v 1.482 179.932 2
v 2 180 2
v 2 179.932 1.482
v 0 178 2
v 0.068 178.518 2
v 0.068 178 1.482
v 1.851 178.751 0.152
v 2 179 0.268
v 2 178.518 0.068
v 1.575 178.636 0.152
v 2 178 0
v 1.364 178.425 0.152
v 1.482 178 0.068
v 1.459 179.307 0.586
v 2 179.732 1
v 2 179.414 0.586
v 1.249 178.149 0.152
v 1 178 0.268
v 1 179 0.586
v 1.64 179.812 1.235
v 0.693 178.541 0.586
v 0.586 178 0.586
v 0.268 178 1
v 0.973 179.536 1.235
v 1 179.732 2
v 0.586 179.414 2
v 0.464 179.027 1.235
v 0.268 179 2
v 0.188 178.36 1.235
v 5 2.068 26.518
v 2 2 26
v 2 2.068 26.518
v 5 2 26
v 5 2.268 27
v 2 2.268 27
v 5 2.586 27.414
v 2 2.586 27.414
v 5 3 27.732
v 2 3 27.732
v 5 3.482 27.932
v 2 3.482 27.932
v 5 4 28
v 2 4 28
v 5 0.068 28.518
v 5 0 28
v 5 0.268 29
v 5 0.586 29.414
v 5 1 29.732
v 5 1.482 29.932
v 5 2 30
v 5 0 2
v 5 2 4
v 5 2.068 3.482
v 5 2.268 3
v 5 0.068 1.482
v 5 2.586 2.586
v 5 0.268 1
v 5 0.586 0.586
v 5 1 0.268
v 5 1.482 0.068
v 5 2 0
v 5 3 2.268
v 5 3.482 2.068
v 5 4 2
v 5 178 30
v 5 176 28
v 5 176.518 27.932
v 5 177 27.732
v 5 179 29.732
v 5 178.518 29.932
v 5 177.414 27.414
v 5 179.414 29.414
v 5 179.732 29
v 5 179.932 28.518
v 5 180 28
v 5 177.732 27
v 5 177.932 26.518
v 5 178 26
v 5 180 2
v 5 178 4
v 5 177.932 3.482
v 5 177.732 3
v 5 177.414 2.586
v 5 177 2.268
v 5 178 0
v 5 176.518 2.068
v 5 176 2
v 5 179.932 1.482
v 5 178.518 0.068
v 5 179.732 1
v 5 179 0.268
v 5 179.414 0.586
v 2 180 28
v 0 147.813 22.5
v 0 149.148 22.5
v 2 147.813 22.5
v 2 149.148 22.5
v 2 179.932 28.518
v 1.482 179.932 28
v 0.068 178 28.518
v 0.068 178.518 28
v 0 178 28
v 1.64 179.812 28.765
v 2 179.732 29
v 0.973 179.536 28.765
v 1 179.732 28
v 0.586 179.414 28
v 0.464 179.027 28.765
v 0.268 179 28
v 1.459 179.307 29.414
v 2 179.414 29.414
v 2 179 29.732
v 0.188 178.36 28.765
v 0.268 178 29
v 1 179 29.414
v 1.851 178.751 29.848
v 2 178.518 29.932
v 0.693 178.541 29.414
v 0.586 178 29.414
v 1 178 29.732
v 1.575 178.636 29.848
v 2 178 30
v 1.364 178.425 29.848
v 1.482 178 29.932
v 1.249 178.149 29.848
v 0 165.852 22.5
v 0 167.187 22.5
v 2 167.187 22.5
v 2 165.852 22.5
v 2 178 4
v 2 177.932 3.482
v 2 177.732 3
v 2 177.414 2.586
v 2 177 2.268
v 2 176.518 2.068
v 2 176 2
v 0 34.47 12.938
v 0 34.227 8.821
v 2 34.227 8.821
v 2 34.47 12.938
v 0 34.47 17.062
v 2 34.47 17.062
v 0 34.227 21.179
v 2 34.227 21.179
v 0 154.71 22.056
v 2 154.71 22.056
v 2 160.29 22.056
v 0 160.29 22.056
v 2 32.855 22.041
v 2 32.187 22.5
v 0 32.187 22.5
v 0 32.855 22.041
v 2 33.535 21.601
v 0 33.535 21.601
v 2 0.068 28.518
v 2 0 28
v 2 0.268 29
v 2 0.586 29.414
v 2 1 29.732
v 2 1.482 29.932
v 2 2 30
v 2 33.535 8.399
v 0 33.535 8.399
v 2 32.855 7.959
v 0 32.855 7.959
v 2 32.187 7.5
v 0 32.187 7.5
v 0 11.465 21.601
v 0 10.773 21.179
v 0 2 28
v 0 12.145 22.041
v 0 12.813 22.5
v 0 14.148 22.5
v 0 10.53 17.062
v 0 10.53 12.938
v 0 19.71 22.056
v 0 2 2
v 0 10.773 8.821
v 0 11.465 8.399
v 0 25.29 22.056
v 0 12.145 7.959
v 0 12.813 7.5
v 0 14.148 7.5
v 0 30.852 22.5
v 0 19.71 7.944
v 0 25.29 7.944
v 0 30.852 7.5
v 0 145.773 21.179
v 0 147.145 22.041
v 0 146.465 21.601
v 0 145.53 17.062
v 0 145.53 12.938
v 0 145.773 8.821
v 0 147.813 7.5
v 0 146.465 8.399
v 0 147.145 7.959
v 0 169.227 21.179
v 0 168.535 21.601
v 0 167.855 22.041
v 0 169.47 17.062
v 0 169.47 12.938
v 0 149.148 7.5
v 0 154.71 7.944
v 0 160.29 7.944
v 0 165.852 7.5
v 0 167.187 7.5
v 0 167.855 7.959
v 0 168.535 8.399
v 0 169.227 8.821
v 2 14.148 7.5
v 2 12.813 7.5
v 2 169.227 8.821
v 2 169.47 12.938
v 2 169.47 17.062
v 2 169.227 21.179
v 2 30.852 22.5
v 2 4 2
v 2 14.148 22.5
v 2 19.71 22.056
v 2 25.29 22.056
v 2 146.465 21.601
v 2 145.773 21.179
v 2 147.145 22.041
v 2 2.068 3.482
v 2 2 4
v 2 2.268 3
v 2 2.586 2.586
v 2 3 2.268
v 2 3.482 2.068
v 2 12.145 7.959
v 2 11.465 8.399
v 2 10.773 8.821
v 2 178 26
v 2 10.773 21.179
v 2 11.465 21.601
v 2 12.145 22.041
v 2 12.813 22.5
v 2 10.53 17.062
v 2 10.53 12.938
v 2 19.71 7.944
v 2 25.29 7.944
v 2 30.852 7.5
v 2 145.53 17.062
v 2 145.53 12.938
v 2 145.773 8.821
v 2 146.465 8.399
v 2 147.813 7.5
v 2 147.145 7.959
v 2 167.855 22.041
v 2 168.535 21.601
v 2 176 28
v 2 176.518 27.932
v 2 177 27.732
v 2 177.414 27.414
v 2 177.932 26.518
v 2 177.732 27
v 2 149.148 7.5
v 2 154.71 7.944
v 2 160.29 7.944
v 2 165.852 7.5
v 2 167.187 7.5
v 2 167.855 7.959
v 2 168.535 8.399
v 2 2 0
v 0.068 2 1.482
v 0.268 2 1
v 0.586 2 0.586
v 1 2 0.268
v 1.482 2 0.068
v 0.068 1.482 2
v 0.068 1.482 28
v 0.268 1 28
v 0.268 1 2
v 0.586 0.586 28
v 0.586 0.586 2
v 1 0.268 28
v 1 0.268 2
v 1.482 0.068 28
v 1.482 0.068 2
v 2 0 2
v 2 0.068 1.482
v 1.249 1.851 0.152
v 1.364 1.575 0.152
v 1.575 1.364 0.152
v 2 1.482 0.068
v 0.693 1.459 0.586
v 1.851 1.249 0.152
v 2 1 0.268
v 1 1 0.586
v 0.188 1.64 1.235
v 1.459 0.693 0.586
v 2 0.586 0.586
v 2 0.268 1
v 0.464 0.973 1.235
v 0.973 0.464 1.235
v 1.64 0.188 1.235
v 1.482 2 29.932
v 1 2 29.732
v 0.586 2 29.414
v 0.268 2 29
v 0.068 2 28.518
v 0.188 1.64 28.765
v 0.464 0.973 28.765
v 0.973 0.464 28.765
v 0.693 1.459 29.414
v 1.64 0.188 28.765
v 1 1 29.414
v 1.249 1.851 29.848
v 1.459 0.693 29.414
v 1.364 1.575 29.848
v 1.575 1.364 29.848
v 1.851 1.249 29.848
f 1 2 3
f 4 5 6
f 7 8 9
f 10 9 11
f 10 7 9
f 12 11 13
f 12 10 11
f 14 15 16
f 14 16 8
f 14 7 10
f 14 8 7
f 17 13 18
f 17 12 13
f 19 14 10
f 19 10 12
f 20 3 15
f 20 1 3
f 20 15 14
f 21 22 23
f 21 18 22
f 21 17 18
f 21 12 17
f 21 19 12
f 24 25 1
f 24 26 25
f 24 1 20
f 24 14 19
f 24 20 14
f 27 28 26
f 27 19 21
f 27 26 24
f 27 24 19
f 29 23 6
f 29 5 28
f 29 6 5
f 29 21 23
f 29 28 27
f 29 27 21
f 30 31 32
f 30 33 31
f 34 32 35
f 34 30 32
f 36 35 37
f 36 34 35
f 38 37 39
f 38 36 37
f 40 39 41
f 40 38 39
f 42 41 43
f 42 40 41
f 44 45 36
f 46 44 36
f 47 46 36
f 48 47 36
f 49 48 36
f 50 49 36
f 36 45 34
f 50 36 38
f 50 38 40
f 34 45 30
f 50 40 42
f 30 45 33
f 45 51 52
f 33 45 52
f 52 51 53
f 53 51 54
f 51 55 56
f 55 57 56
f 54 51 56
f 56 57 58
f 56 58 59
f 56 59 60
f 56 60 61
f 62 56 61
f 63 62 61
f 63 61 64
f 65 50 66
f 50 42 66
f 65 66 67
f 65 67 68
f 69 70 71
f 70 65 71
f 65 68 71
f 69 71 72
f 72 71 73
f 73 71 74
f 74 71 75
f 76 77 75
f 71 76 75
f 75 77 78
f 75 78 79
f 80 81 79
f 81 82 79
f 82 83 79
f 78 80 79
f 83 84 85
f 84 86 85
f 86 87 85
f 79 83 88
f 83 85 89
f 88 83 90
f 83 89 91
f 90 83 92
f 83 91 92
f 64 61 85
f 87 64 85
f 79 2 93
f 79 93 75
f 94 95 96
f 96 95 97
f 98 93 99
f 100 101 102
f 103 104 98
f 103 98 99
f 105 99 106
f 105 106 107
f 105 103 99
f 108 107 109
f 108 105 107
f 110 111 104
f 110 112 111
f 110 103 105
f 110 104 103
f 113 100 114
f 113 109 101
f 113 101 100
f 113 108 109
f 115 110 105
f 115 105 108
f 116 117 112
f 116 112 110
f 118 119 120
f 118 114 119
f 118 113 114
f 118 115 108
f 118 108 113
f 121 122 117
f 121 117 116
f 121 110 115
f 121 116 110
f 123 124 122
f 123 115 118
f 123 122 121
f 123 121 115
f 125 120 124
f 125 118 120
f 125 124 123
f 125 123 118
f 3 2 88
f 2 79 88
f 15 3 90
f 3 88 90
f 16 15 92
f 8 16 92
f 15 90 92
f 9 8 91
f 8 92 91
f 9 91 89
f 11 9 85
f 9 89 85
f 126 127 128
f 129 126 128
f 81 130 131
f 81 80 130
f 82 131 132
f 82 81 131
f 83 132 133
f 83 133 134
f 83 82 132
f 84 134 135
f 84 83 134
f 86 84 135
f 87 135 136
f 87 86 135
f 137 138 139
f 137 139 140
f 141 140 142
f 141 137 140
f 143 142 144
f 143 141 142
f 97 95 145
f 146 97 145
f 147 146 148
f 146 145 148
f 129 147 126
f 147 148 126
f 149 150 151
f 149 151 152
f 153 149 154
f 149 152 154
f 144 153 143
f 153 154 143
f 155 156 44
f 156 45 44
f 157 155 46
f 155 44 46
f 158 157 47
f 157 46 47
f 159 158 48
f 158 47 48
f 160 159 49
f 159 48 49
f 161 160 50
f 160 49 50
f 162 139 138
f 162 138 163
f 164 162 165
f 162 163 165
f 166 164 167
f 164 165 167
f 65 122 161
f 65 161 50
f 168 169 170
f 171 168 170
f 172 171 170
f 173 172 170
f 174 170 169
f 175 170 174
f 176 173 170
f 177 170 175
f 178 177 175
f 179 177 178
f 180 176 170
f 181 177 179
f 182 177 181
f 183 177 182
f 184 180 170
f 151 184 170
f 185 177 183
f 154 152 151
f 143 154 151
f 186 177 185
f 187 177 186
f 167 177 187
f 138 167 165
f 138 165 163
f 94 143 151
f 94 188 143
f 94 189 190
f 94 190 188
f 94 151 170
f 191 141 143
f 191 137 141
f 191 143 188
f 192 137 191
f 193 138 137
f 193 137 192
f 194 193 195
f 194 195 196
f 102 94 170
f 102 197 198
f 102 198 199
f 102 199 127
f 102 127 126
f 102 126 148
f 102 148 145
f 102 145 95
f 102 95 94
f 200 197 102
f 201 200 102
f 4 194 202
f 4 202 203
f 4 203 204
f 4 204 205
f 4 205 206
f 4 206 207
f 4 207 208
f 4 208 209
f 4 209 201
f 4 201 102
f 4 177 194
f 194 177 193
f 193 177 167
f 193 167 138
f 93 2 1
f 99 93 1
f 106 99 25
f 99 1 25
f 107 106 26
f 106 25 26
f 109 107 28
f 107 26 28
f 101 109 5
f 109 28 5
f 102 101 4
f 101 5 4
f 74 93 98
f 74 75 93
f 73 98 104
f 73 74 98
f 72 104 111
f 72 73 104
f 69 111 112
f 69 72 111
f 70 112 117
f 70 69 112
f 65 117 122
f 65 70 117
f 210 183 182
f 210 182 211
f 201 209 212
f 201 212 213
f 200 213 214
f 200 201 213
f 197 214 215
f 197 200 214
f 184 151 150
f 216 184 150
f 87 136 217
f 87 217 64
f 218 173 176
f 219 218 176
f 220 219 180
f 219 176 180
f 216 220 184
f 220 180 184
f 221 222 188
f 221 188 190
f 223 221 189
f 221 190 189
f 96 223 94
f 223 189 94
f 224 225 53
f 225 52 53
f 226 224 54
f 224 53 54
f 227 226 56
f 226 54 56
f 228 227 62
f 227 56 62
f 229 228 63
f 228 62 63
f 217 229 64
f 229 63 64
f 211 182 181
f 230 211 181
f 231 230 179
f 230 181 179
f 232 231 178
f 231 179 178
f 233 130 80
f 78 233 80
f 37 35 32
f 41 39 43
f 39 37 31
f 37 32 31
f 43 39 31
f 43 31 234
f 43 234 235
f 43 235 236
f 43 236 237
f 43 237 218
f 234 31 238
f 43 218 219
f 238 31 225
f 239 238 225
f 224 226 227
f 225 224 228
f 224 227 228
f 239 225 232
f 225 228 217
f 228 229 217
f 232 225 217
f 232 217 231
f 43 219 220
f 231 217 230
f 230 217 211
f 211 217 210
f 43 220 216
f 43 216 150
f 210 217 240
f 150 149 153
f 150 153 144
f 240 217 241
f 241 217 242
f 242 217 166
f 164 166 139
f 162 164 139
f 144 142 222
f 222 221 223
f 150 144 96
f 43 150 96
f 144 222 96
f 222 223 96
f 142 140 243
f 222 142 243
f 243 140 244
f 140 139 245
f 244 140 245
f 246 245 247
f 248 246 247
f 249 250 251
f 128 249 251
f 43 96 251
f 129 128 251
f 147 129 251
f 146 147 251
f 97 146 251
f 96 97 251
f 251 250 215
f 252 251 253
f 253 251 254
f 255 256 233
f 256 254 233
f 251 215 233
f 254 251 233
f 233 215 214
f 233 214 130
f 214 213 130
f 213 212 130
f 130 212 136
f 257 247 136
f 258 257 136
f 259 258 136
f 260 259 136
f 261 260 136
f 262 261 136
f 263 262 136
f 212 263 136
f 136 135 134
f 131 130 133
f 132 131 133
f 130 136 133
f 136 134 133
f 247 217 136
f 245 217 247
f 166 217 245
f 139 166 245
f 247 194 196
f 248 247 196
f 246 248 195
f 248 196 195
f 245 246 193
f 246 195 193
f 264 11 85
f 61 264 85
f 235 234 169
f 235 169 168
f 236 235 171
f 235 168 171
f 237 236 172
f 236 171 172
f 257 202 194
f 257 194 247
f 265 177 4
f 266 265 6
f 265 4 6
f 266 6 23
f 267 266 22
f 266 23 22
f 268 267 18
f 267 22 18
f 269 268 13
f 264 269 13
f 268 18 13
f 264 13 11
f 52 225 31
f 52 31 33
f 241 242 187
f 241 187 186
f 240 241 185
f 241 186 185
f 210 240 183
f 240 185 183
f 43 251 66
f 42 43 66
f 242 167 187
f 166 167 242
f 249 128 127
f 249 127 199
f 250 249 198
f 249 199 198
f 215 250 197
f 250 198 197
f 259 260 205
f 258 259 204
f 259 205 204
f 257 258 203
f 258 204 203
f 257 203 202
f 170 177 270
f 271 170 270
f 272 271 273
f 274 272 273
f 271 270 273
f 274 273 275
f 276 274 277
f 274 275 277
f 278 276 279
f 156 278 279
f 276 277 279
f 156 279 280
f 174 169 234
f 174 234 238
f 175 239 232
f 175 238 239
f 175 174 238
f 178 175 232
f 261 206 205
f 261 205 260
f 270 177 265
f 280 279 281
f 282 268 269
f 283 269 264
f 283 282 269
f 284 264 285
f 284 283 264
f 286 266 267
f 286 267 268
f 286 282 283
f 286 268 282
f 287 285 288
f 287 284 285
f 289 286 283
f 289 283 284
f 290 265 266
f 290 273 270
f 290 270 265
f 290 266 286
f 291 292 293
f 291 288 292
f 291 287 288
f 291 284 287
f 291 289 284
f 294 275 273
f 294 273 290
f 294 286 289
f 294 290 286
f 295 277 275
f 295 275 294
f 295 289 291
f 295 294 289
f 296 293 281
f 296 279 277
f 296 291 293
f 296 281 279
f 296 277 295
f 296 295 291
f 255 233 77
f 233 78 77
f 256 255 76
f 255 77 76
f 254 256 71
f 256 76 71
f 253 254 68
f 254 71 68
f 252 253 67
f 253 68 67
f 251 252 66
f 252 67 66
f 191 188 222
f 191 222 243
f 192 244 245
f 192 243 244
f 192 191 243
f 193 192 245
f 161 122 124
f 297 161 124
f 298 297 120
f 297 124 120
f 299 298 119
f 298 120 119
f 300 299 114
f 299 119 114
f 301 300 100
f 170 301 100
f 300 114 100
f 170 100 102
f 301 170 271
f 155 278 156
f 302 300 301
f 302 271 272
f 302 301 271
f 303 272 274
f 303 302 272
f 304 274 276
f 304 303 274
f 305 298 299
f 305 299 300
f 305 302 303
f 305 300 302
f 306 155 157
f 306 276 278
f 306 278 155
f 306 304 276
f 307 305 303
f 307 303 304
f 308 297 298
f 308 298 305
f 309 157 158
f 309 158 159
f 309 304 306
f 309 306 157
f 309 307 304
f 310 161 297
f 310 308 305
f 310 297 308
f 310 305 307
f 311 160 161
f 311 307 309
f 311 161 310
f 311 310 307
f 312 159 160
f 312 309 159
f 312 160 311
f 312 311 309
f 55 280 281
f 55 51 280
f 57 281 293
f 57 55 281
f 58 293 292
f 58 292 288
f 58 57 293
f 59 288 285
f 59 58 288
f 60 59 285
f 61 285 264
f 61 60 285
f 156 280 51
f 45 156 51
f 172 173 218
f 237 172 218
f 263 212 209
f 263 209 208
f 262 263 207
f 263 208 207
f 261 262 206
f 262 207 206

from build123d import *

# Parameters (mm, degrees)
BOX002_W          = 3
BOX002_H          = 176
BOX002_DEPTH      = 26
FILLET001_R       = 2
CYLINDER020_R     = 30
CYLINDER020_DEPTH = 10
CYLINDER019_R     = 30
CYLINDER019_DEPTH = 10
CYLINDER018_R     = 30
CYLINDER018_DEPTH = 10
CYLINDER016_R     = 30
CYLINDER016_DEPTH = 10
CYLINDER017_R     = 70
CYLINDER017_DEPTH = 10
CYLINDER015_R     = 70
CYLINDER015_DEPTH = 10
CYLINDER014_R     = 70
CYLINDER014_DEPTH = 10
CYLINDER013_R     = 70
CYLINDER013_DEPTH = 10
BOX004_W          = 10
BOX004_H          = 24
BOX004_DEPTH      = 15
CYLINDER012_R     = 30
CYLINDER012_DEPTH = 10
CYLINDER011_R     = 30
CYLINDER011_DEPTH = 10
CYLINDER010_R     = 30
CYLINDER010_DEPTH = 10
CYLINDER008_R     = 30
CYLINDER008_DEPTH = 10
CYLINDER009_R     = 70
CYLINDER009_DEPTH = 10
CYLINDER006_R     = 70
CYLINDER006_DEPTH = 10
CYLINDER005_R     = 70
CYLINDER005_DEPTH = 10
CYLINDER004_R     = 70
CYLINDER004_DEPTH = 10
BOX003_W          = 10
BOX003_H          = 24
BOX003_DEPTH      = 15
BOX_W             = 2
BOX_H             = 176
BOX_DEPTH         = 26
CYLINDER_R        = 2
CYLINDER_DEPTH    = 26
CYLINDER001_R     = 2
CYLINDER001_DEPTH = 26
CYLINDER002_R     = 2
CYLINDER002_DEPTH = 176
CYLINDER003_R     = 2
CYLINDER003_DEPTH = 176
BOX001_W          = 3
BOX001_H          = 180
BOX001_DEPTH      = 30
FILLET_R          = 2


with BuildPart() as fillet001:
    # Box002 → Box002 (new body)
    with BuildSketch(Plane(origin=(7, 2, 2), x_dir=(1, 0, 0), z_dir=(0, 0, 1))):
        with Locations((1.5, 88)):
            Rectangle(BOX002_W, BOX002_H)
    extrude(amount=BOX002_DEPTH)

    # Fillet001
    fillet001_edges = [fillet001.edges().sort_by_distance(p)[0] for p in [
        (8.5, 2, 2),
        (8.5, 2, 28),
        (8.5, 178, 2),
        (8.5, 178, 28),
    ]]
    fillet(fillet001_edges, radius=FILLET001_R)


with BuildPart() as fillet001_1:
    # Fillet001 placement: moved
    add(fillet001.part.moved(Location((-5, 0, 0))))


with BuildPart() as cylinder020:
    # Cylinder020 → Cylinder020 (new body)
    with BuildSketch(Plane(origin=(22, -27, 39.5), x_dir=(0, 0, -1), z_dir=(1, 0, 0))):
        Circle(CYLINDER020_R)
    extrude(amount=CYLINDER020_DEPTH)


with BuildPart() as cylinder019:
    # Cylinder019 → Cylinder019 (new body)
    with BuildSketch(Plane(origin=(22, -27, -24.5), x_dir=(0, 0, -1), z_dir=(1, 0, 0))):
        Circle(CYLINDER019_R)
    extrude(amount=CYLINDER019_DEPTH)


with BuildPart() as cylinder018:
    # Cylinder018 → Cylinder018 (new body)
    with BuildSketch(Plane(origin=(22, 27, -24.5), x_dir=(0, 0, -1), z_dir=(1, 0, 0))):
        Circle(CYLINDER018_R)
    extrude(amount=CYLINDER018_DEPTH)


with BuildPart() as cylinder016:
    # Cylinder016 → Cylinder016 (new body)
    with BuildSketch(Plane(origin=(22, 27, 39.5), x_dir=(0, 0, -1), z_dir=(1, 0, 0))):
        Circle(CYLINDER016_R)
    extrude(amount=CYLINDER016_DEPTH)


with BuildPart() as cylinder017:
    # Cylinder017 → Cylinder017 (new body)
    with BuildSketch(Plane(origin=(22, -58, 7.5), x_dir=(0, 0, -1), z_dir=(1, 0, 0))):
        Circle(CYLINDER017_R)
    extrude(amount=CYLINDER017_DEPTH)


with BuildPart() as cylinder015:
    # Cylinder015 → Cylinder015 (new body)
    with BuildSketch(Plane(origin=(22, 58, 7.5), x_dir=(0, 0, -1), z_dir=(1, 0, 0))):
        Circle(CYLINDER015_R)
    extrude(amount=CYLINDER015_DEPTH)


with BuildPart() as cylinder014:
    # Cylinder014 → Cylinder014 (new body)
    with BuildSketch(Plane(origin=(22, 0, 84.5), x_dir=(0, 0, -1), z_dir=(1, 0, 0))):
        Circle(CYLINDER014_R)
    extrude(amount=CYLINDER014_DEPTH)


with BuildPart() as cylinder013:
    # Cylinder013 → Cylinder013 (new body)
    with BuildSketch(Plane(origin=(22, 0, -69.5), x_dir=(0, 0, -1), z_dir=(1, 0, 0))):
        Circle(CYLINDER013_R)
    extrude(amount=CYLINDER013_DEPTH)


with BuildPart() as cut011:
    # Box004 → Box004 (new body)
    with BuildSketch(Plane(origin=(22, -12, 0), x_dir=(1, 0, 0), z_dir=(0, 0, 1))):
        with Locations((5, 12)):
            Rectangle(BOX004_W, BOX004_H)
    extrude(amount=BOX004_DEPTH)

    # Cut006: cut Cylinder013
    add(cylinder013.part, mode=Mode.SUBTRACT)

    # Cut007: cut Cylinder014
    add(cylinder014.part, mode=Mode.SUBTRACT)

    # Common002: intersect Cylinder015
    add(cylinder015.part, mode=Mode.INTERSECT)

    # Common003: intersect Cylinder017
    add(cylinder017.part, mode=Mode.INTERSECT)

    # Cut008: cut Cylinder016
    add(cylinder016.part, mode=Mode.SUBTRACT)

    # Cut009: cut Cylinder018
    add(cylinder018.part, mode=Mode.SUBTRACT)

    # Cut010: cut Cylinder019
    add(cylinder019.part, mode=Mode.SUBTRACT)

    # Cut011: cut Cylinder020
    add(cylinder020.part, mode=Mode.SUBTRACT)


with BuildPart() as cut011_1:
    # Cut011 placement: moved
    add(cut011.part.moved(Location((-25, 22.5, 7.5))))


with BuildPart() as cylinder012:
    # Cylinder012 → Cylinder012 (new body)
    with BuildSketch(Plane(origin=(22, -27, 39.5), x_dir=(0, 0, -1), z_dir=(1, 0, 0))):
        Circle(CYLINDER012_R)
    extrude(amount=CYLINDER012_DEPTH)


with BuildPart() as cylinder011:
    # Cylinder011 → Cylinder011 (new body)
    with BuildSketch(Plane(origin=(22, -27, -24.5), x_dir=(0, 0, -1), z_dir=(1, 0, 0))):
        Circle(CYLINDER011_R)
    extrude(amount=CYLINDER011_DEPTH)


with BuildPart() as cylinder010:
    # Cylinder010 → Cylinder010 (new body)
    with BuildSketch(Plane(origin=(22, 27, -24.5), x_dir=(0, 0, -1), z_dir=(1, 0, 0))):
        Circle(CYLINDER010_R)
    extrude(amount=CYLINDER010_DEPTH)


with BuildPart() as cylinder008:
    # Cylinder008 → Cylinder008 (new body)
    with BuildSketch(Plane(origin=(22, 27, 39.5), x_dir=(0, 0, -1), z_dir=(1, 0, 0))):
        Circle(CYLINDER008_R)
    extrude(amount=CYLINDER008_DEPTH)


with BuildPart() as cylinder009:
    # Cylinder009 → Cylinder009 (new body)
    with BuildSketch(Plane(origin=(22, -58, 7.5), x_dir=(0, 0, -1), z_dir=(1, 0, 0))):
        Circle(CYLINDER009_R)
    extrude(amount=CYLINDER009_DEPTH)


with BuildPart() as cylinder006:
    # Cylinder006 → Cylinder006 (new body)
    with BuildSketch(Plane(origin=(22, 58, 7.5), x_dir=(0, 0, -1), z_dir=(1, 0, 0))):
        Circle(CYLINDER006_R)
    extrude(amount=CYLINDER006_DEPTH)


with BuildPart() as cylinder005:
    # Cylinder005 → Cylinder005 (new body)
    with BuildSketch(Plane(origin=(22, 0, 84.5), x_dir=(0, 0, -1), z_dir=(1, 0, 0))):
        Circle(CYLINDER005_R)
    extrude(amount=CYLINDER005_DEPTH)


with BuildPart() as cylinder:
    # Cylinder004 → Cylinder004 (new body)
    with BuildSketch(Plane(origin=(22, 0, -69.5), x_dir=(0, 0, -1), z_dir=(1, 0, 0))):
        Circle(CYLINDER004_R)
    extrude(amount=CYLINDER004_DEPTH)


with BuildPart() as cut005:
    # Box003 → Box003 (new body)
    with BuildSketch(Plane(origin=(22, -12, 0), x_dir=(1, 0, 0), z_dir=(0, 0, 1))):
        with Locations((5, 12)):
            Rectangle(BOX003_W, BOX003_H)
    extrude(amount=BOX003_DEPTH)

    # Cut: cut Cylinder
    add(cylinder.part, mode=Mode.SUBTRACT)

    # Cut001: cut Cylinder005
    add(cylinder005.part, mode=Mode.SUBTRACT)

    # Common: intersect Cylinder006
    add(cylinder006.part, mode=Mode.INTERSECT)

    # Common001: intersect Cylinder009
    add(cylinder009.part, mode=Mode.INTERSECT)

    # Cut002: cut Cylinder008
    add(cylinder008.part, mode=Mode.SUBTRACT)

    # Cut003: cut Cylinder010
    add(cylinder010.part, mode=Mode.SUBTRACT)

    # Cut004: cut Cylinder011
    add(cylinder011.part, mode=Mode.SUBTRACT)

    # Cut005: cut Cylinder012
    add(cylinder012.part, mode=Mode.SUBTRACT)


with BuildPart() as cut005_1:
    # Cut005 placement: moved
    add(cut005.part.moved(Location((-25, 157.5, 7.5))))


with BuildPart() as cube001:
    # Box → Box (new body)
    with BuildSketch(Plane(origin=(0, 2, 2), x_dir=(1, 0, 0), z_dir=(0, 0, 1))):
        with Locations((1, 88)):
            Rectangle(BOX_W, BOX_H)
    extrude(amount=BOX_DEPTH)


with BuildPart() as cylinder001:
    # Cylinder → Cylinder (new body)
    with BuildSketch(Plane(origin=(2, 2, 2), x_dir=(0, 1, 0), z_dir=(0, 0, 1))):
        Circle(CYLINDER_R)
    extrude(amount=CYLINDER_DEPTH)


with BuildPart() as cylinder002:
    # Cylinder001 → Cylinder001 (new body)
    with BuildSketch(Plane(origin=(2, 178, 2), x_dir=(0, 1, 0), z_dir=(0, 0, 1))):
        Circle(CYLINDER001_R)
    extrude(amount=CYLINDER001_DEPTH)


with BuildPart() as cylinder003:
    # Cylinder002 → Cylinder002 (new body)
    with BuildSketch(Plane(origin=(2, 178, 2), x_dir=(1, 0, 0), z_dir=(0, -1, 0))):
        Circle(CYLINDER002_R)
    extrude(amount=CYLINDER002_DEPTH)


with BuildPart() as cylinder004:
    # Cylinder003 → Cylinder003 (new body)
    with BuildSketch(Plane(origin=(2, 178, 28), x_dir=(1, 0, 0), z_dir=(0, -1, 0))):
        Circle(CYLINDER003_R)
    extrude(amount=CYLINDER003_DEPTH)


with BuildPart() as sphere001:
    # Sphere → Sphere (revolve)
    with BuildSketch(Plane(origin=(2, 2, 2), x_dir=(1, 0, 0), z_dir=(0, -1, 0))):
        with BuildLine():
            ThreePointArc((0, -2), (2, 0), (0, 2))
            Line((0, 2), (0, -2))
        make_face()
    revolve(axis=Axis((2, 2, 2), (0, 0, 1)))


with BuildPart() as sphere002:
    # Sphere001 → Sphere001 (revolve)
    with BuildSketch(Plane(origin=(2, 178, 2), x_dir=(1, 0, 0), z_dir=(0, -1, 0))):
        with BuildLine():
            ThreePointArc((0, -2), (2, 0), (0, 2))
            Line((0, 2), (0, -2))
        make_face()
    revolve(axis=Axis((2, 178, 2), (0, 0, 1)))


with BuildPart() as sphere003:
    # Sphere002 → Sphere002 (revolve)
    with BuildSketch(Plane(origin=(2, 2, 28), x_dir=(1, 0, 0), z_dir=(0, -1, 0))):
        with BuildLine():
            ThreePointArc((0, -2), (2, 0), (0, 2))
            Line((0, 2), (0, -2))
        make_face()
    revolve(axis=Axis((2, 2, 28), (0, 0, 1)))


with BuildPart() as sphere004:
    # Sphere003 → Sphere003 (revolve)
    with BuildSketch(Plane(origin=(2, 178, 28), x_dir=(1, 0, 0), z_dir=(0, -1, 0))):
        with BuildLine():
            ThreePointArc((0, -2), (2, 0), (0, 2))
            Line((0, 2), (0, -2))
        make_face()
    revolve(axis=Axis((2, 178, 28), (0, 0, 1)))


with BuildPart() as cut014:
    # Box001 → Box001 (new body)
    with BuildSketch(Plane(origin=(2, 0, 0), x_dir=(1, 0, 0), z_dir=(0, 0, 1))):
        with Locations((1.5, 90)):
            Rectangle(BOX001_W, BOX001_H)
    extrude(amount=BOX001_DEPTH)

    # Fillet
    fillet_edges = [cut014.edges().sort_by_distance(p)[0] for p in [
        (3.5, 0, 0),
        (3.5, 0, 30),
        (3.5, 180, 0),
        (3.5, 180, 30),
    ]]
    fillet(fillet_edges, radius=FILLET_R)

    # Fusion: union Cube001, Cylinder001, Cylinder002, Cylinder003, Cylinder004, Sphere001, Sphere002, Sphere003, Sphere004
    add(cube001.part)
    add(cylinder001.part)
    add(cylinder002.part)
    add(cylinder003.part)
    add(cylinder004.part)
    add(sphere001.part)
    add(sphere002.part)
    add(sphere003.part)
    add(sphere004.part)

    # Cut012: cut Cut005
    add(cut005_1.part, mode=Mode.SUBTRACT)

    # Cut013: cut Cut011
    add(cut011_1.part, mode=Mode.SUBTRACT)

    # Cut014: cut Fillet001
    add(fillet001_1.part, mode=Mode.SUBTRACT)


solid = cut014.part
